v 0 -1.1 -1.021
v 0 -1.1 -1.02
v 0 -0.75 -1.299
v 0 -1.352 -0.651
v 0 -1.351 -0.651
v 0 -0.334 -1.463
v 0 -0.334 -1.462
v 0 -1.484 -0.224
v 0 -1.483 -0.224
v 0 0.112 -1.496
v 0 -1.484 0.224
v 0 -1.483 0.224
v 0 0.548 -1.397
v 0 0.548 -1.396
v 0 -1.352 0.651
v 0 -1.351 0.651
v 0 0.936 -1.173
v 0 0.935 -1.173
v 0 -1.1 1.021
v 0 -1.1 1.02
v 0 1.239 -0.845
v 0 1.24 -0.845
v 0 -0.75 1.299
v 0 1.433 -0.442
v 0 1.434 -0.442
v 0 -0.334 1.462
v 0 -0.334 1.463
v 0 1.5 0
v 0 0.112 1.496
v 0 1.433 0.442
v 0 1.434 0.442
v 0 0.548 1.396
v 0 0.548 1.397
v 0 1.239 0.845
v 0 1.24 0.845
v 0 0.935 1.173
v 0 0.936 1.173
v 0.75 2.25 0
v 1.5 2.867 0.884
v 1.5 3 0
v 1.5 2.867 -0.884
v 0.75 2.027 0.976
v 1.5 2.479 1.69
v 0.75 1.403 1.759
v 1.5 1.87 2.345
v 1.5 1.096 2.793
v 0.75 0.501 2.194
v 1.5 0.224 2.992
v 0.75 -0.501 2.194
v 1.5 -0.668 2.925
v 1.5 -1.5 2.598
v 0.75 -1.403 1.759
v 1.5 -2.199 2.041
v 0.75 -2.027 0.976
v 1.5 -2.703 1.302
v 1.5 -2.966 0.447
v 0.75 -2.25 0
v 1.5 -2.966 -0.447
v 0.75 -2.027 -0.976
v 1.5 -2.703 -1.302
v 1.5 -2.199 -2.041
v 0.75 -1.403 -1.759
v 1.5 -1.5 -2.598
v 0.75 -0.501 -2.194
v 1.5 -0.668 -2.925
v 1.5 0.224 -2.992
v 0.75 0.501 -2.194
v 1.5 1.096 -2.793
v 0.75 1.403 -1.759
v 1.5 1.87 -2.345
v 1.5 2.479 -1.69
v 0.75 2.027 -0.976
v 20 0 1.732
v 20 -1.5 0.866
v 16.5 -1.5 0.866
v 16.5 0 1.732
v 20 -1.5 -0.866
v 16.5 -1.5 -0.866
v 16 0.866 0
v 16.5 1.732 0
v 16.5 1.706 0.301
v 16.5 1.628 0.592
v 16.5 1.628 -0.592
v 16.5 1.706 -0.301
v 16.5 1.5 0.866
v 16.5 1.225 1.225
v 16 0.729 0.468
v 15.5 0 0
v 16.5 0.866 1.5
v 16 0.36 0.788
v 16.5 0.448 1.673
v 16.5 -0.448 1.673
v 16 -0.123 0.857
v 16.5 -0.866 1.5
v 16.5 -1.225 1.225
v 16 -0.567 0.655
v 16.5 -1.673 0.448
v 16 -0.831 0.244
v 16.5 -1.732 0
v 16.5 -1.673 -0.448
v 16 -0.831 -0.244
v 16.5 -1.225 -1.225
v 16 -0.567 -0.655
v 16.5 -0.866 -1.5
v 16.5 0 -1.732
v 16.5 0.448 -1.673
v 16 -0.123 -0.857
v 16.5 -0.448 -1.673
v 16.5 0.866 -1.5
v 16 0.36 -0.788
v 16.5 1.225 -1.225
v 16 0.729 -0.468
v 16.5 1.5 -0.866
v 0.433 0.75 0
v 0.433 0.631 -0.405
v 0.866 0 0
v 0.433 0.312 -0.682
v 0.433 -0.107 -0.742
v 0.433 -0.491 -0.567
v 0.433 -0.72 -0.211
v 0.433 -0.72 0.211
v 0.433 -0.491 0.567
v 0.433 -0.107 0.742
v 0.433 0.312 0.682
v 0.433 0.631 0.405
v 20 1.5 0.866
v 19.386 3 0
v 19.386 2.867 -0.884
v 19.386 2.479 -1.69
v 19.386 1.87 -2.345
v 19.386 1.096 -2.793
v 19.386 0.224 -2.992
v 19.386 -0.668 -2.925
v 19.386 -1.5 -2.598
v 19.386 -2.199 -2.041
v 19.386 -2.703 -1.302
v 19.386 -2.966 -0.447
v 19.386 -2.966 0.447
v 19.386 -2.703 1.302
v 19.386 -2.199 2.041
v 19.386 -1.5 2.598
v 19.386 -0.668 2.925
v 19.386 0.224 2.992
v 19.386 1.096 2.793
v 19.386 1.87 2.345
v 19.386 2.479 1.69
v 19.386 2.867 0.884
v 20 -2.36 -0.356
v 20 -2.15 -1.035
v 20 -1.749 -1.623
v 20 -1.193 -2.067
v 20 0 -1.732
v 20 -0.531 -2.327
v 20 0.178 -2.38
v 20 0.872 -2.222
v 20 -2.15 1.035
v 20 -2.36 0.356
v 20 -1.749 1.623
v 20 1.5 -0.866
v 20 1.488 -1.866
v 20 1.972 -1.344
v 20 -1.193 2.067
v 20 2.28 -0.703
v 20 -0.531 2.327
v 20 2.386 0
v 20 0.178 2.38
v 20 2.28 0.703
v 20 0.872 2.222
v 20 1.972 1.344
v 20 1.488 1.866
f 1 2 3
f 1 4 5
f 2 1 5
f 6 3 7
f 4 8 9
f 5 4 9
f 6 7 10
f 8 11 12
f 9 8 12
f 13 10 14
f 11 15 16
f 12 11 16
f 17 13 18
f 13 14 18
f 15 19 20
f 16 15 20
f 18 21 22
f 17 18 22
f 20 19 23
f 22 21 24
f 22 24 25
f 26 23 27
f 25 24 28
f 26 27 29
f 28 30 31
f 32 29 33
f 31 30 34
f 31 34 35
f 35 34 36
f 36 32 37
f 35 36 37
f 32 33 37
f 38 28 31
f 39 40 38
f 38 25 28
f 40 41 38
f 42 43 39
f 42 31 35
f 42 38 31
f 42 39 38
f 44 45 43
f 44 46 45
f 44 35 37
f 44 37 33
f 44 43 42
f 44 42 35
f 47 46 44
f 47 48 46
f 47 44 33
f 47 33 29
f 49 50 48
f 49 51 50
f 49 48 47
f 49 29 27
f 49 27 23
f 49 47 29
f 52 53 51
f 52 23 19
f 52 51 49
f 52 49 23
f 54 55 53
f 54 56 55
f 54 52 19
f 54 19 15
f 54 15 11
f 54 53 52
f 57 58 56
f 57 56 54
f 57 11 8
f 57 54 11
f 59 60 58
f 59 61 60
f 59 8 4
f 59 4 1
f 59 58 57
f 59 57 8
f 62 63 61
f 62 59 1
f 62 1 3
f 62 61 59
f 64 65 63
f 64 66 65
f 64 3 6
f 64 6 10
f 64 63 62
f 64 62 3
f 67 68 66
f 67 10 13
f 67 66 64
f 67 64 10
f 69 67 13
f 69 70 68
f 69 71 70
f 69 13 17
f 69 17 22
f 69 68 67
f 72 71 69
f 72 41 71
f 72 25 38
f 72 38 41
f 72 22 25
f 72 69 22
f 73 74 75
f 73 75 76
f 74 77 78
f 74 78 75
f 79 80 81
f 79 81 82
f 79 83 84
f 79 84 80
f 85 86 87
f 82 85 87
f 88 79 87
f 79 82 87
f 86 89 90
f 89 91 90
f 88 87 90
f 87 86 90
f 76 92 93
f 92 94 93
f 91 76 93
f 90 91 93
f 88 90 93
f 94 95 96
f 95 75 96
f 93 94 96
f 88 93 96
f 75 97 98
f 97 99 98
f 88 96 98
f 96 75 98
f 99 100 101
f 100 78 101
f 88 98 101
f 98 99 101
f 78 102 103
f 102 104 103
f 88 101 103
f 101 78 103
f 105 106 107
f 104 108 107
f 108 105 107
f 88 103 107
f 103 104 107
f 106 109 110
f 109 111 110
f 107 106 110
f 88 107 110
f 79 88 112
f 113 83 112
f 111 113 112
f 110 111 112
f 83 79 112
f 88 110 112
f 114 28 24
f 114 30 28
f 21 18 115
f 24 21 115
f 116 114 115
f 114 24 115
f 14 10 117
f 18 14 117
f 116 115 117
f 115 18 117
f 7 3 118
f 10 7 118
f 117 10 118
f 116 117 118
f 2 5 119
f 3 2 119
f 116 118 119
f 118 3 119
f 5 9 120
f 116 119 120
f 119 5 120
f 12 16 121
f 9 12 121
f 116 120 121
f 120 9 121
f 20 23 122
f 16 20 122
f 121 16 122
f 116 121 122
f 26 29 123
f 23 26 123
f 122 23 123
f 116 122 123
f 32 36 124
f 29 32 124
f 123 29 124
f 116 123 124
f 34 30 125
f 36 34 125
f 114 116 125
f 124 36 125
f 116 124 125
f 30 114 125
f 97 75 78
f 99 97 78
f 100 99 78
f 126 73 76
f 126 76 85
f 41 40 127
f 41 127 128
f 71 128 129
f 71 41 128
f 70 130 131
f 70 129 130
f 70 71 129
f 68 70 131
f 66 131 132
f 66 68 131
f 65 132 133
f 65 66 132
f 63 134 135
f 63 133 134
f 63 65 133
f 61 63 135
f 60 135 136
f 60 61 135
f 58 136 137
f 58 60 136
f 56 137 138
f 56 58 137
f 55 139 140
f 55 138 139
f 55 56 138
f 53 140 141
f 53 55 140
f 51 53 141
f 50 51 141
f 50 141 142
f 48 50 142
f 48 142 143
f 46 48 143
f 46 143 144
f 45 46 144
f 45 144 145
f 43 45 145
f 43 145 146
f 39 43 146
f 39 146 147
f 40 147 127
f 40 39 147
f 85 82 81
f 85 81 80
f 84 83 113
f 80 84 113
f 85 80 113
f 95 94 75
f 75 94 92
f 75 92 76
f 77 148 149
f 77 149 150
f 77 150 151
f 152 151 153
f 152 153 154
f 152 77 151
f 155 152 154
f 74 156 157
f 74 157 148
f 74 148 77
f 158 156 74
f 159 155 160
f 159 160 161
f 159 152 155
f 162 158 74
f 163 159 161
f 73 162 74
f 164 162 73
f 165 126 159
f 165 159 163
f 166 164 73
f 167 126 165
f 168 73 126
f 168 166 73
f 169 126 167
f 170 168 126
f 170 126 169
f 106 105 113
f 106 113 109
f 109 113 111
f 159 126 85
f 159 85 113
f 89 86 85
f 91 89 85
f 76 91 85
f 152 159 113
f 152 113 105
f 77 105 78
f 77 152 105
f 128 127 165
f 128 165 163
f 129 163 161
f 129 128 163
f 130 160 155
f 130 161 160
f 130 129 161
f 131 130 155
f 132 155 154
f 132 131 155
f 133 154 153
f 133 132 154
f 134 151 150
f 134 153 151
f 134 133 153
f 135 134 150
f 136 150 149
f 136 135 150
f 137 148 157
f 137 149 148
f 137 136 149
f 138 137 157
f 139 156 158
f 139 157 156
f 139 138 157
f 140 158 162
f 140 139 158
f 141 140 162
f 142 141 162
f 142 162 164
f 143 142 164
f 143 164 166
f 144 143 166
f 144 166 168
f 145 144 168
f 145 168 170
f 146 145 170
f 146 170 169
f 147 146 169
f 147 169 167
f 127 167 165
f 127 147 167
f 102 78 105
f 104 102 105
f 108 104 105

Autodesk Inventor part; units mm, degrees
ref_plane "YZ Plane" through (0, 0, 0) normal (1, 0, 0) x (0, 1, 0)
ref_plane "XZ Plane" through (0, 0, 0) normal (0, 1, 0) x (-1, 0, 0)
sketch "Skizze1" plane through (0, 0, 0) normal (0, 0, 1) x (1, 0, 0)
  line L0 (0.866, 0) -> (15.5, 0)
  line L1 (20, 1.7321) -> (20, 3)
  line L2 (20, 3) -> (0, 3)
  line L3 (20, 1.7321) -> (16.5, 1.7321)
  line L4 (16.5, 1.7321) -> (15.5, 0)
  line L5 (0, 1.5) -> (0.866, 0)
  line L6 (0, -0.6) -> (0, 3.6) projected
  line L7 (0, 1.5) -> (0, 3)
  point P0 (0, 0)
  dimension "d0" = 3.5
  dimension "d1" = 60
  dimension "d2" = 6
  dimension "d3" = 3.4641
  dimension "d4" = 20
  dimension "d5" = 60
  dimension "d7" = 3
revolve "Körper" add sketch "Skizze1" angle 360 about axis through (0.866, 0, 0) along (1, 0, 0)
sketch "Skizze2" plane through (20, 0, 0) normal (1, 0, 0) x (0, 0, -1)
  circle A0 centre (0, 0) radius 1.7321 projected
  circle A1 centre (0, 0) radius 3 projected
  line L0 (1.7321, 0) -> (0.866, -1.5)
  line L1 (0.866, -1.5) -> (-0.866, -1.5)
  line L2 (-0.866, -1.5) -> (-1.7321, 0)
  line L3 (-1.7321, 0) -> (-0.866, 1.5)
  line L4 (-0.866, 1.5) -> (0.866, 1.5)
  line L5 (0.866, 1.5) -> (1.7321, 0)
extrude "Loch" add sketch "Skizze2" against normal blind 3.5 contours L5 A0 | A0 L0 | L4 A0 | A0 L1 | L3 A0 | A0 L2
chamfer "Fase1" distance 1.5 angle 45 1 edges at (0, -3, 0) measured on face at (0, 2.4709, -0.2393)
thread "Gewinde" size "M6x1" class "6g" standard "ISO Metric profile" length 20
chamfer "Fase2" distance 0.6135 angle 45 1 edges at (20, -3, 0) measured on face at (13.8332, 2.9612, -0.4812)
ref_plane "Work Plane1" through (10, 0, 0) normal (0, -0.5, -0.866) x (1, 0, 0)
equation "\"d0\" = INTI"
equation "\"d2\" = NND"
equation "\"d3\" = 1.1547 * SW"
equation "\"d4\" = NLG"
equation "\"d5\" = 0.5 * ANG"
equation "\"d7\" = SPD"
equation "\"d8\" = INTI"
equation "\"d10\" = -0.5 * SPD + 0.5 * NND"
equation "\"d11\" = FAWI"
equation "\"d33\" = -0.5 * SPD + 0.5 * NND"
equation "\"d14\" = NLG"
equation "\"d12\" = -0.5 * GD1 + 0.5 * NND"
equation "\"d13\" = FAWI"
equation "\"d34\" = -0.5 * GD1 + 0.5 * NND"
equation "\"NND\" = 6"
equation "\"NLG\" = 20"
equation "\"INTI\" = 3.5"
equation "\"FAWI\" = 45deg"
equation "\"SW\" = 3"
equation "\"GD1\" = THREADDIA - 1.2269 * PTC"
equation "\"ANG\" = 120deg"
equation "\"FAWI1\" = 45deg"
equation "\"SPD\" = 3"
equation "\"GUL\" = 0.61345 * PTC"
equation "\"TOA\" = 30deg"
equation "\"THREADDIA\" = 6"
equation "\"PTC\" = 1"
equation "\"GAL\" = 0.61345 * PTC"
equation "\"E0\" = 1.155 * SW"
properties part number "ISO 4029 - M6 x 20" material "Edelstahl, 440C"
